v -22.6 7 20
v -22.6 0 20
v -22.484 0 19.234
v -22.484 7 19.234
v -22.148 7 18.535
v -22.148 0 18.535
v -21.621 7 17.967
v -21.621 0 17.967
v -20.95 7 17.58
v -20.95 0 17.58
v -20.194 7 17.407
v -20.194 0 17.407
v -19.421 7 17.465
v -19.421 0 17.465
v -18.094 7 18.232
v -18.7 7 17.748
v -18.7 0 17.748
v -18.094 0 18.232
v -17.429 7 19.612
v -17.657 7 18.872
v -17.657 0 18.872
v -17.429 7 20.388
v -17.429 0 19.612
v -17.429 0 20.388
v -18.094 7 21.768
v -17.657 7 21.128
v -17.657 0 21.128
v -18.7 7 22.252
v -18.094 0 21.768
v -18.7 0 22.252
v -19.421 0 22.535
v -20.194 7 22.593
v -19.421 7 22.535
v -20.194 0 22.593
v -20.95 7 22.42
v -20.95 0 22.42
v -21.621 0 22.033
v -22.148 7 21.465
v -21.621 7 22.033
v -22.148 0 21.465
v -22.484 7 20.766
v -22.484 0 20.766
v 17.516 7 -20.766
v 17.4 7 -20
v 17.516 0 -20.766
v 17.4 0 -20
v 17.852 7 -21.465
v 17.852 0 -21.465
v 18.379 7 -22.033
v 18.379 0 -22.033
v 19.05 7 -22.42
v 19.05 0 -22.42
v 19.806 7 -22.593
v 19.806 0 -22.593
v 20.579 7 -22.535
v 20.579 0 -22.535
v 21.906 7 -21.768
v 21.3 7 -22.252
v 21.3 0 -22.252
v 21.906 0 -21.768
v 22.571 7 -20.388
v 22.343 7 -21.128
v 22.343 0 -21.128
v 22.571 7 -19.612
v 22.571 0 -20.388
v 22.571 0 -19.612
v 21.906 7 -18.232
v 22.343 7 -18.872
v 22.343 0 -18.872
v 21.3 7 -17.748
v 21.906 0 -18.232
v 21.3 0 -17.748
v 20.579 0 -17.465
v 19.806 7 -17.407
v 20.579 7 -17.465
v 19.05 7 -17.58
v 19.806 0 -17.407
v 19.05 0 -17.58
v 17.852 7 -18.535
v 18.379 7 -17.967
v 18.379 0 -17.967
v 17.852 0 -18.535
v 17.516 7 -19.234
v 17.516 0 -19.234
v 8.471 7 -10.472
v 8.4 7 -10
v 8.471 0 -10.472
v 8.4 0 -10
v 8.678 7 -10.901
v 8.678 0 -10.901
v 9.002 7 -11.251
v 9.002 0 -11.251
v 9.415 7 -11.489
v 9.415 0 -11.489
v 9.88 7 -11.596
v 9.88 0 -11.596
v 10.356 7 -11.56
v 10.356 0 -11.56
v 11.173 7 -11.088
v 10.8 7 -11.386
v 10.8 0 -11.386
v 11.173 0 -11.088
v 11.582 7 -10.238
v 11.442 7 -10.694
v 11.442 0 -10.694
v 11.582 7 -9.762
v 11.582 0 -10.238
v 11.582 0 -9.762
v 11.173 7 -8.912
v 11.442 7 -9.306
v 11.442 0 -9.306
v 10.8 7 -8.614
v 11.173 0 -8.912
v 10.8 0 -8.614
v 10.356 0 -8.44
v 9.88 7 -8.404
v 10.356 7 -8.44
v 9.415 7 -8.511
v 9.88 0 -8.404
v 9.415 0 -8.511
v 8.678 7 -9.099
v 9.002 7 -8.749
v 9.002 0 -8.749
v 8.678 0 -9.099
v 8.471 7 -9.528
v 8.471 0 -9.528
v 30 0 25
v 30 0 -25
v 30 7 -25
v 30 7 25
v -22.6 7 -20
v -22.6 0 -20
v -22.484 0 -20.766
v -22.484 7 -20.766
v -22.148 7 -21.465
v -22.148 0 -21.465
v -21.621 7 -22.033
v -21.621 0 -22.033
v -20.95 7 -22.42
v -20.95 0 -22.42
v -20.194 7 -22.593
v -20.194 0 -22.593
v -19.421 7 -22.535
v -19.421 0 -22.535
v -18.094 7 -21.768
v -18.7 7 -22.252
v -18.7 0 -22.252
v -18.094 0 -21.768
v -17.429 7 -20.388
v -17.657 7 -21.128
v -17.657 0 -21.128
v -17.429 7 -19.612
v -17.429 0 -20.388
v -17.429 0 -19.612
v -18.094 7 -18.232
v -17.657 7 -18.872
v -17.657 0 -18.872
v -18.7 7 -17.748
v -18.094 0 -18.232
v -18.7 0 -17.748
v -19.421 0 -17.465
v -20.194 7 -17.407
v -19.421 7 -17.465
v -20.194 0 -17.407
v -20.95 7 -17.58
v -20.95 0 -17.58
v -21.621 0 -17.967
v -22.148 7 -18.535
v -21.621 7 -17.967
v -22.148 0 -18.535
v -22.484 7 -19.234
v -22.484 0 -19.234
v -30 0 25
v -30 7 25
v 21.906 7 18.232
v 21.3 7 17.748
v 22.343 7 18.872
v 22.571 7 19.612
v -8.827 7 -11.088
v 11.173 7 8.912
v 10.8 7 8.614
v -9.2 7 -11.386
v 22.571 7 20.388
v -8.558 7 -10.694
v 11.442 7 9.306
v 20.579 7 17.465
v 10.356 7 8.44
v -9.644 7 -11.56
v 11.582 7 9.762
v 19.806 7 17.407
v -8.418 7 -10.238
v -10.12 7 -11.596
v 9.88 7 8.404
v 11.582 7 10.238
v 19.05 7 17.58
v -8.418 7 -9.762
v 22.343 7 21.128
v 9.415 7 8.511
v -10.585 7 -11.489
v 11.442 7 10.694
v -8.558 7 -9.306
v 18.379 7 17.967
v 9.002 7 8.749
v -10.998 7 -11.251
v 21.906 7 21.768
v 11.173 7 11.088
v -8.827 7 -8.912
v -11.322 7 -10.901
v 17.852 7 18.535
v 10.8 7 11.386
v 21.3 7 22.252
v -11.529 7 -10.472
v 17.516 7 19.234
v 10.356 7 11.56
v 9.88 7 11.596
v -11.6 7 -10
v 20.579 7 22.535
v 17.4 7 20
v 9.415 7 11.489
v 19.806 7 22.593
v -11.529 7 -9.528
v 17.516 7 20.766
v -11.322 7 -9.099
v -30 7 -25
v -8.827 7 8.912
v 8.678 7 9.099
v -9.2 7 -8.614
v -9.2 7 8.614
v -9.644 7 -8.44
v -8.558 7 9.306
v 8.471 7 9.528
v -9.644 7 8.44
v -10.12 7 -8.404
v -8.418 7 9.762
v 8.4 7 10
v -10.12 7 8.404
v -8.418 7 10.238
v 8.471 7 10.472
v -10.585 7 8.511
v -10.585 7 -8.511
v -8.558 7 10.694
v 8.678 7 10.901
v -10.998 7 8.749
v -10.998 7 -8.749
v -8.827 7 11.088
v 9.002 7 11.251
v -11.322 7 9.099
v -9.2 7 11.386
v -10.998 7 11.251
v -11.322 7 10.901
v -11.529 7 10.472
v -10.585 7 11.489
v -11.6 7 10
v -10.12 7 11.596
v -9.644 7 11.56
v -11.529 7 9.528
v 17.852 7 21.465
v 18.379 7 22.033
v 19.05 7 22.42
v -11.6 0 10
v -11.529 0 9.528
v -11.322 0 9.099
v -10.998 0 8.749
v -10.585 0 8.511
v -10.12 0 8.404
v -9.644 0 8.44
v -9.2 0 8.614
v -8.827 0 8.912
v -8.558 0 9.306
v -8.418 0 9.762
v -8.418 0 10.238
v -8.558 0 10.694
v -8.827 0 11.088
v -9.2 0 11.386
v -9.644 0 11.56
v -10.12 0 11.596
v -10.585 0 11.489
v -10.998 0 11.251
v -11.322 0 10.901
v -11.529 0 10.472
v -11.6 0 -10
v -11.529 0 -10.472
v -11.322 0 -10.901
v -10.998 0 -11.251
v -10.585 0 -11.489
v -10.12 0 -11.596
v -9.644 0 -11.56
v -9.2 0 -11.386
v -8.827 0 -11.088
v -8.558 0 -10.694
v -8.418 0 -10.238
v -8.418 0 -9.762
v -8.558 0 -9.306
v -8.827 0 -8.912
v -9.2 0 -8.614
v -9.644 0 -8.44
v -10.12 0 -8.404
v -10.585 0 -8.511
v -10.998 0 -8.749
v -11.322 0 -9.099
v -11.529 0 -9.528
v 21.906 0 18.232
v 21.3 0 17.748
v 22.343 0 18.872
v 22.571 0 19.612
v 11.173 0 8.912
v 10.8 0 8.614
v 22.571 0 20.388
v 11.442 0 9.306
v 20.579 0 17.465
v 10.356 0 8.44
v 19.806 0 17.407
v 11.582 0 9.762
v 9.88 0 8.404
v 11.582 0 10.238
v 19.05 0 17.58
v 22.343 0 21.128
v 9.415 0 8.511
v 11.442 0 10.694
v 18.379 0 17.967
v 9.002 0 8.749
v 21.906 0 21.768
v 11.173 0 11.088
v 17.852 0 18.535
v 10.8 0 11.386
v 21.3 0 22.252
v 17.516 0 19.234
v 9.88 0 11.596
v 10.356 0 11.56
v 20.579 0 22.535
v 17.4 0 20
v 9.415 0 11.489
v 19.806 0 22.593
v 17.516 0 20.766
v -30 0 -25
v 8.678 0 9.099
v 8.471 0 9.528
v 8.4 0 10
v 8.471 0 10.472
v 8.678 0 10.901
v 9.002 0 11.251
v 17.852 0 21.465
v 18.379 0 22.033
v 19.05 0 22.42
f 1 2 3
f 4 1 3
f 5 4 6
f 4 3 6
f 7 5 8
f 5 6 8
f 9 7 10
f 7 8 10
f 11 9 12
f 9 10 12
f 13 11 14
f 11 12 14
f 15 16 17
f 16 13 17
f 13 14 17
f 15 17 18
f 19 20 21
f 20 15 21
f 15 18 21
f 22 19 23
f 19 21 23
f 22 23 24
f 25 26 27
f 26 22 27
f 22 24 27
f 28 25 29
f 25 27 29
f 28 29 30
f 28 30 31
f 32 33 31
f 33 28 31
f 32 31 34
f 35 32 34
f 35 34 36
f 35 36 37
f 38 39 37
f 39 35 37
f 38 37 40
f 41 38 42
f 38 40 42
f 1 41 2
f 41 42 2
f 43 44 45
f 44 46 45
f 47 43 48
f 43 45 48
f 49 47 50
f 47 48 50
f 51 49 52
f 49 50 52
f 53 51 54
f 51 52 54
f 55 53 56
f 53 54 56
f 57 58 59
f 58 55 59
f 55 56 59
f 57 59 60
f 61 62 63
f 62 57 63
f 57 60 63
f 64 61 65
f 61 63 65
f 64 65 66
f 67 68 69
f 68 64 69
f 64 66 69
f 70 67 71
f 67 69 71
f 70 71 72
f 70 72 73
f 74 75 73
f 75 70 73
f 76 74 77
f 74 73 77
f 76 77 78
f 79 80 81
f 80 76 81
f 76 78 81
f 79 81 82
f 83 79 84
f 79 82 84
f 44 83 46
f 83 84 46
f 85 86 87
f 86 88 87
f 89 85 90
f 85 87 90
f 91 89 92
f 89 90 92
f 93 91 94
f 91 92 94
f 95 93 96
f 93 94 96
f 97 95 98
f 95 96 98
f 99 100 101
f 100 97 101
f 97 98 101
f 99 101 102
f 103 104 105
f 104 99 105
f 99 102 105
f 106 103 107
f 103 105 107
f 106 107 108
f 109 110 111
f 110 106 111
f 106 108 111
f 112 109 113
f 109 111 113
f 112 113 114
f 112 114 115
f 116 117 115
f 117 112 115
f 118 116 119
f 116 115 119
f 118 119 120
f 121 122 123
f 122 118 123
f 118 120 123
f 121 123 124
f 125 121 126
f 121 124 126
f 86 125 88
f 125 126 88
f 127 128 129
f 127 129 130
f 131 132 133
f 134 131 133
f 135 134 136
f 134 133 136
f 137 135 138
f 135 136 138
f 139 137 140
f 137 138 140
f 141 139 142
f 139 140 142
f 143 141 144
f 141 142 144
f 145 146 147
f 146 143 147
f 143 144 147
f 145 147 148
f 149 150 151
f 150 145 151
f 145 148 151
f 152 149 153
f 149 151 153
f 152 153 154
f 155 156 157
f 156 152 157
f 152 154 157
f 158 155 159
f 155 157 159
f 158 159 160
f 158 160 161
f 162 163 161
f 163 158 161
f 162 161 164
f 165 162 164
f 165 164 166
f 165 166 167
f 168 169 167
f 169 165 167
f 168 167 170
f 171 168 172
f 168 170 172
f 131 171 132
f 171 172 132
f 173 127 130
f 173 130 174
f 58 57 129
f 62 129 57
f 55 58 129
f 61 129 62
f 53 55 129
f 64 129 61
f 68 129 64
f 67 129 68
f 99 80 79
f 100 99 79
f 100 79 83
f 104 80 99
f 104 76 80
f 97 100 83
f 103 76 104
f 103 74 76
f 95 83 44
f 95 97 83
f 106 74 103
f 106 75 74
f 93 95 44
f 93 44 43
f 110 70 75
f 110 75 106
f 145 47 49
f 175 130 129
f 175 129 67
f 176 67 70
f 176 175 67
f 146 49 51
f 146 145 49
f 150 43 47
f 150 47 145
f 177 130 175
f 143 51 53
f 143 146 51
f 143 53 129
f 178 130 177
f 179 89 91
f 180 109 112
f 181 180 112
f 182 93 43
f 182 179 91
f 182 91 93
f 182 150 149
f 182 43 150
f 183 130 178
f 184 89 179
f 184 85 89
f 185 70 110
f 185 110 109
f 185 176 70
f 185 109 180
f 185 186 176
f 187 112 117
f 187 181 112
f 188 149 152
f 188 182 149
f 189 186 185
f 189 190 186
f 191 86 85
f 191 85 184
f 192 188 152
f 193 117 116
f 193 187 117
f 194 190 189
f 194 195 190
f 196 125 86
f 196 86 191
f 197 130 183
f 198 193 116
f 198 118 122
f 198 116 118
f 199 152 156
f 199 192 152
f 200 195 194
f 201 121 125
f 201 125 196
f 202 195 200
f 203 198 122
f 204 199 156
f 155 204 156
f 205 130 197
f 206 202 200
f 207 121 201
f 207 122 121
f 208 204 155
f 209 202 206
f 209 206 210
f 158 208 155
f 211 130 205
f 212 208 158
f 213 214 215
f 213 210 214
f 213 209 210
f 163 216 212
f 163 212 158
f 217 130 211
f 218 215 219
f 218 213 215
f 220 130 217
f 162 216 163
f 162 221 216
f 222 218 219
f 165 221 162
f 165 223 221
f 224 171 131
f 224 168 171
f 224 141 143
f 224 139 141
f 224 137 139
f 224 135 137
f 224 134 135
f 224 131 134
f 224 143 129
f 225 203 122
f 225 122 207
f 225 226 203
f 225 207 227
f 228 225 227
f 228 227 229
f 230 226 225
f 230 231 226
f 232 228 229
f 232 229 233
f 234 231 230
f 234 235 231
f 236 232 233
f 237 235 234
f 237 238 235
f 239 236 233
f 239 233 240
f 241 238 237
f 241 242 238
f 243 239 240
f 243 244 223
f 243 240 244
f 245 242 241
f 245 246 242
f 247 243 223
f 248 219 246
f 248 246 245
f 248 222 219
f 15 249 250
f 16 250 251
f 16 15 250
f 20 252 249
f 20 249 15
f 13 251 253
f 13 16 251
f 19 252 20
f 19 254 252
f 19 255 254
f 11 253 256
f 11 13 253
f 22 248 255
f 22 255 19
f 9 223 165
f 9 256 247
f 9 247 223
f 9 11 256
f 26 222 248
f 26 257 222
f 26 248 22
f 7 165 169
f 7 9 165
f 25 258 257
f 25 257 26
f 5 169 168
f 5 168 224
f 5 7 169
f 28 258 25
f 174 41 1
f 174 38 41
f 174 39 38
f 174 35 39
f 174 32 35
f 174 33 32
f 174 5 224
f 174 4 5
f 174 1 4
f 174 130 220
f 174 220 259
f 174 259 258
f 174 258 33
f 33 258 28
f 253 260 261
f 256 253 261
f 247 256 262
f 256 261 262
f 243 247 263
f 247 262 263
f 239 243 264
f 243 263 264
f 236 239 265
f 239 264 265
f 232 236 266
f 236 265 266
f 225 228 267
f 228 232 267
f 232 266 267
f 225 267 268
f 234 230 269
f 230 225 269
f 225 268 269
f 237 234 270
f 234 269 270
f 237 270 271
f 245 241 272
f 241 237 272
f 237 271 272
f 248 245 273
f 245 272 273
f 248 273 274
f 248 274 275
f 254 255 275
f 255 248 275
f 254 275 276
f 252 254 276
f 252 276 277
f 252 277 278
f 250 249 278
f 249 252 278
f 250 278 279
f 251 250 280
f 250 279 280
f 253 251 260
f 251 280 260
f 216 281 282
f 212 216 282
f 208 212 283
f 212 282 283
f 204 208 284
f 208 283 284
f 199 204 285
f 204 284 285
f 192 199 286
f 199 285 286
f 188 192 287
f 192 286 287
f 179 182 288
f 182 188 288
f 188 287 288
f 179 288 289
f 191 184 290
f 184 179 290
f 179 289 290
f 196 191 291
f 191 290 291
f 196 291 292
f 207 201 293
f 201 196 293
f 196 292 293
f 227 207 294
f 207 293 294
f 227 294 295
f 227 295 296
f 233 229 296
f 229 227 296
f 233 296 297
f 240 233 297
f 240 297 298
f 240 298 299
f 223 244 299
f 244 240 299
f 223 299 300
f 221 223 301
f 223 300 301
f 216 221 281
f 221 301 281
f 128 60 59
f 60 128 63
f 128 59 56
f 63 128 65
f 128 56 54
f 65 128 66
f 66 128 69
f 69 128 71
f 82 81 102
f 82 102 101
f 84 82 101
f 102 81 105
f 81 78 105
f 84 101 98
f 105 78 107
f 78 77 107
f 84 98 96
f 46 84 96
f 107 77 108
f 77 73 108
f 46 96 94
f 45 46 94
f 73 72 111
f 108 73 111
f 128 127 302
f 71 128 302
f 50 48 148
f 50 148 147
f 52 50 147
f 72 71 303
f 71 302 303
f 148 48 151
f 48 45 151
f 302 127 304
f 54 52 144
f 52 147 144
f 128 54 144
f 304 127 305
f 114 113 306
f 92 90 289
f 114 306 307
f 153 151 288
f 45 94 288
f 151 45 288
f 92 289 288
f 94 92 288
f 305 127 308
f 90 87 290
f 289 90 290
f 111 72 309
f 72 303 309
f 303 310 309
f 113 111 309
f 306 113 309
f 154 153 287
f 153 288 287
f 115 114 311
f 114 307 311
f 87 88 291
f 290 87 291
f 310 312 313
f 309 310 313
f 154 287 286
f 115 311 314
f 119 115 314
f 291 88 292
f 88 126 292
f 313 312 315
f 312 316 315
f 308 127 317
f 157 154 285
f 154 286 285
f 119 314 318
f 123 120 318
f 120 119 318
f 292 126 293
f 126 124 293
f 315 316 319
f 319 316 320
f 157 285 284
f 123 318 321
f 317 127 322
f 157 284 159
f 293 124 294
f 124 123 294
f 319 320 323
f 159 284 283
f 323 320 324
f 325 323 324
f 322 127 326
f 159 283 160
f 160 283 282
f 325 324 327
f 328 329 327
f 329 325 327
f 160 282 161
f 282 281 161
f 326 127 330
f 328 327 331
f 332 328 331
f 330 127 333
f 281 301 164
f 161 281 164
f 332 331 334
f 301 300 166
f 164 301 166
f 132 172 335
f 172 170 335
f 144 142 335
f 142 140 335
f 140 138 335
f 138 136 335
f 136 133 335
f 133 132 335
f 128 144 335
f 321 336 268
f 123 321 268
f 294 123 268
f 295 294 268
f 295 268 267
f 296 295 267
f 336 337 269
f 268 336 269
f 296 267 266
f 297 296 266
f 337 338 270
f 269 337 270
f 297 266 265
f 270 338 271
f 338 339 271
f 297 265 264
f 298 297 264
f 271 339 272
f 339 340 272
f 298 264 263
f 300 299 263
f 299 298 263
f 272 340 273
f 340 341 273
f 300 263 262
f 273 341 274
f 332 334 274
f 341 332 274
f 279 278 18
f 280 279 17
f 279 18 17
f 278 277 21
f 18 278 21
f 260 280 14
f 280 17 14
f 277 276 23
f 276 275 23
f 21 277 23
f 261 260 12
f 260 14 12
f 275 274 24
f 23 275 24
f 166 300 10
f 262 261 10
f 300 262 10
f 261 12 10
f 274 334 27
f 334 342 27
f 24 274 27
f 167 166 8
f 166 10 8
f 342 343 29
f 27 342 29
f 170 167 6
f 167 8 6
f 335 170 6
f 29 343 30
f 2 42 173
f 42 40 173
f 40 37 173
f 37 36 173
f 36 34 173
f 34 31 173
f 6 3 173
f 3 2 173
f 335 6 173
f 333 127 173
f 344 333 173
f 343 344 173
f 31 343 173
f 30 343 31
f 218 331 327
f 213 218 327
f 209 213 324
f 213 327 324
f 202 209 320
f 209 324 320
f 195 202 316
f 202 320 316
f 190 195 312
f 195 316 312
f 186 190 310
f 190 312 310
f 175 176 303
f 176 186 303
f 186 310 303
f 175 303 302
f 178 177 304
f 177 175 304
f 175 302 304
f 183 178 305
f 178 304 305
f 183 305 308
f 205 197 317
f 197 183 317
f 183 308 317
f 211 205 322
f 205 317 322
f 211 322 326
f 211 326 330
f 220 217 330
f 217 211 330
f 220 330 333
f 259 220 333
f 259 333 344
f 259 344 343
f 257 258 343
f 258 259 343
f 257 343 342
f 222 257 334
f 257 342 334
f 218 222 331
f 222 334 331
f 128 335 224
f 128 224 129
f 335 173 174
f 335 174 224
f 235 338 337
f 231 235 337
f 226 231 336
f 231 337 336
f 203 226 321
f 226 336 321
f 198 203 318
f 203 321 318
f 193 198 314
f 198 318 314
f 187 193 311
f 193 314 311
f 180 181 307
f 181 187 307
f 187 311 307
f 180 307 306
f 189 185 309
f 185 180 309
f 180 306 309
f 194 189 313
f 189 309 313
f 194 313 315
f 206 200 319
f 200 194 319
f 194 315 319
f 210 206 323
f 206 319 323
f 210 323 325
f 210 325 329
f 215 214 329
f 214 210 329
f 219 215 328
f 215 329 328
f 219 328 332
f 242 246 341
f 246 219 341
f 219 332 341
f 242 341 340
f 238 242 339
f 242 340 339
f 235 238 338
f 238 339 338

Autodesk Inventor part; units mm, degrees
ref_plane "YZ Plane" through (0, 0, 0) normal (1, 0, 0) x (0, 1, 0)
ref_plane "XZ Plane" through (0, 0, 0) normal (0, 1, 0) x (-1, 0, 0)
ref_plane "XY Plane" through (0, 0, 0) normal (0, 0, 1) x (1, 0, 0)
sketch "Sketch2" plane through (0, 0, 0) normal (0, 1, 0) x (-1, 0, 0)
  line L0 (-10, 10) -> (10, 10) construction
  line L1 (10, 10) -> (10, -10) construction
  line L2 (10, -10) -> (-10, -10) construction
  line L3 (-10, -10) -> (-10, 10) construction
  line L4 (-10, 10) -> (10, -10) construction
  line L5 (10, 10) -> (-10, -10) construction
  line L6 (-20, 20) -> (20, 20) construction
  line L7 (20, 20) -> (20, -20) construction
  line L8 (20, -20) -> (-20, -20) construction
  line L9 (-20, -20) -> (-20, 20) construction
  line L10 (-20, 20) -> (20, -20) construction
  line L11 (20, 20) -> (-20, -20) construction
  line L12 (-30, 25) -> (30, 25)
  line L13 (30, 25) -> (30, -25)
  line L14 (30, -25) -> (-30, -25)
  line L15 (-30, -25) -> (-30, 25)
  line L16 (-30, 25) -> (30, -25) construction
  line L17 (30, 25) -> (-30, -25) construction
  circle A0 centre (-20, -20) radius 2.6
  circle A1 centre (20, -20) radius 2.6
  circle A2 centre (20, 20) radius 2.6
  circle A3 centre (-20, 20) radius 2.6
  circle A4 centre (-10, -10) radius 1.6
  circle A5 centre (10, -10) radius 1.6
  circle A6 centre (10, 10) radius 1.6
  circle A7 centre (-10, 10) radius 1.6
  point P0 (0, 0)
  dimension "d7" = 40
  dimension "d8" = 60
  dimension "d9" = 20
  dimension "d10" = 5.2
  dimension "d11" = 3.2
  dimension "d17" = 50
extrude "Extrusion2" add sketch "Sketch2" along normal blind 7
sketch "Sketch3" plane through (-30, 0, 25) normal (0, 0, 1) x (1, 0, 0)
  circle A0 centre (30, 3.5) radius 1.6
  line L0 (0, 0) -> (60, 0) projected
  line L1 (60, 0) -> (60, 7) projected
  point P0 (30, 0)
  point P1 (30, 0)
  point P2 (60, 3.5)
  dimension "d14" = 3.2
extrude "Extrusion3" [suppressed]
properties part number "Master"
